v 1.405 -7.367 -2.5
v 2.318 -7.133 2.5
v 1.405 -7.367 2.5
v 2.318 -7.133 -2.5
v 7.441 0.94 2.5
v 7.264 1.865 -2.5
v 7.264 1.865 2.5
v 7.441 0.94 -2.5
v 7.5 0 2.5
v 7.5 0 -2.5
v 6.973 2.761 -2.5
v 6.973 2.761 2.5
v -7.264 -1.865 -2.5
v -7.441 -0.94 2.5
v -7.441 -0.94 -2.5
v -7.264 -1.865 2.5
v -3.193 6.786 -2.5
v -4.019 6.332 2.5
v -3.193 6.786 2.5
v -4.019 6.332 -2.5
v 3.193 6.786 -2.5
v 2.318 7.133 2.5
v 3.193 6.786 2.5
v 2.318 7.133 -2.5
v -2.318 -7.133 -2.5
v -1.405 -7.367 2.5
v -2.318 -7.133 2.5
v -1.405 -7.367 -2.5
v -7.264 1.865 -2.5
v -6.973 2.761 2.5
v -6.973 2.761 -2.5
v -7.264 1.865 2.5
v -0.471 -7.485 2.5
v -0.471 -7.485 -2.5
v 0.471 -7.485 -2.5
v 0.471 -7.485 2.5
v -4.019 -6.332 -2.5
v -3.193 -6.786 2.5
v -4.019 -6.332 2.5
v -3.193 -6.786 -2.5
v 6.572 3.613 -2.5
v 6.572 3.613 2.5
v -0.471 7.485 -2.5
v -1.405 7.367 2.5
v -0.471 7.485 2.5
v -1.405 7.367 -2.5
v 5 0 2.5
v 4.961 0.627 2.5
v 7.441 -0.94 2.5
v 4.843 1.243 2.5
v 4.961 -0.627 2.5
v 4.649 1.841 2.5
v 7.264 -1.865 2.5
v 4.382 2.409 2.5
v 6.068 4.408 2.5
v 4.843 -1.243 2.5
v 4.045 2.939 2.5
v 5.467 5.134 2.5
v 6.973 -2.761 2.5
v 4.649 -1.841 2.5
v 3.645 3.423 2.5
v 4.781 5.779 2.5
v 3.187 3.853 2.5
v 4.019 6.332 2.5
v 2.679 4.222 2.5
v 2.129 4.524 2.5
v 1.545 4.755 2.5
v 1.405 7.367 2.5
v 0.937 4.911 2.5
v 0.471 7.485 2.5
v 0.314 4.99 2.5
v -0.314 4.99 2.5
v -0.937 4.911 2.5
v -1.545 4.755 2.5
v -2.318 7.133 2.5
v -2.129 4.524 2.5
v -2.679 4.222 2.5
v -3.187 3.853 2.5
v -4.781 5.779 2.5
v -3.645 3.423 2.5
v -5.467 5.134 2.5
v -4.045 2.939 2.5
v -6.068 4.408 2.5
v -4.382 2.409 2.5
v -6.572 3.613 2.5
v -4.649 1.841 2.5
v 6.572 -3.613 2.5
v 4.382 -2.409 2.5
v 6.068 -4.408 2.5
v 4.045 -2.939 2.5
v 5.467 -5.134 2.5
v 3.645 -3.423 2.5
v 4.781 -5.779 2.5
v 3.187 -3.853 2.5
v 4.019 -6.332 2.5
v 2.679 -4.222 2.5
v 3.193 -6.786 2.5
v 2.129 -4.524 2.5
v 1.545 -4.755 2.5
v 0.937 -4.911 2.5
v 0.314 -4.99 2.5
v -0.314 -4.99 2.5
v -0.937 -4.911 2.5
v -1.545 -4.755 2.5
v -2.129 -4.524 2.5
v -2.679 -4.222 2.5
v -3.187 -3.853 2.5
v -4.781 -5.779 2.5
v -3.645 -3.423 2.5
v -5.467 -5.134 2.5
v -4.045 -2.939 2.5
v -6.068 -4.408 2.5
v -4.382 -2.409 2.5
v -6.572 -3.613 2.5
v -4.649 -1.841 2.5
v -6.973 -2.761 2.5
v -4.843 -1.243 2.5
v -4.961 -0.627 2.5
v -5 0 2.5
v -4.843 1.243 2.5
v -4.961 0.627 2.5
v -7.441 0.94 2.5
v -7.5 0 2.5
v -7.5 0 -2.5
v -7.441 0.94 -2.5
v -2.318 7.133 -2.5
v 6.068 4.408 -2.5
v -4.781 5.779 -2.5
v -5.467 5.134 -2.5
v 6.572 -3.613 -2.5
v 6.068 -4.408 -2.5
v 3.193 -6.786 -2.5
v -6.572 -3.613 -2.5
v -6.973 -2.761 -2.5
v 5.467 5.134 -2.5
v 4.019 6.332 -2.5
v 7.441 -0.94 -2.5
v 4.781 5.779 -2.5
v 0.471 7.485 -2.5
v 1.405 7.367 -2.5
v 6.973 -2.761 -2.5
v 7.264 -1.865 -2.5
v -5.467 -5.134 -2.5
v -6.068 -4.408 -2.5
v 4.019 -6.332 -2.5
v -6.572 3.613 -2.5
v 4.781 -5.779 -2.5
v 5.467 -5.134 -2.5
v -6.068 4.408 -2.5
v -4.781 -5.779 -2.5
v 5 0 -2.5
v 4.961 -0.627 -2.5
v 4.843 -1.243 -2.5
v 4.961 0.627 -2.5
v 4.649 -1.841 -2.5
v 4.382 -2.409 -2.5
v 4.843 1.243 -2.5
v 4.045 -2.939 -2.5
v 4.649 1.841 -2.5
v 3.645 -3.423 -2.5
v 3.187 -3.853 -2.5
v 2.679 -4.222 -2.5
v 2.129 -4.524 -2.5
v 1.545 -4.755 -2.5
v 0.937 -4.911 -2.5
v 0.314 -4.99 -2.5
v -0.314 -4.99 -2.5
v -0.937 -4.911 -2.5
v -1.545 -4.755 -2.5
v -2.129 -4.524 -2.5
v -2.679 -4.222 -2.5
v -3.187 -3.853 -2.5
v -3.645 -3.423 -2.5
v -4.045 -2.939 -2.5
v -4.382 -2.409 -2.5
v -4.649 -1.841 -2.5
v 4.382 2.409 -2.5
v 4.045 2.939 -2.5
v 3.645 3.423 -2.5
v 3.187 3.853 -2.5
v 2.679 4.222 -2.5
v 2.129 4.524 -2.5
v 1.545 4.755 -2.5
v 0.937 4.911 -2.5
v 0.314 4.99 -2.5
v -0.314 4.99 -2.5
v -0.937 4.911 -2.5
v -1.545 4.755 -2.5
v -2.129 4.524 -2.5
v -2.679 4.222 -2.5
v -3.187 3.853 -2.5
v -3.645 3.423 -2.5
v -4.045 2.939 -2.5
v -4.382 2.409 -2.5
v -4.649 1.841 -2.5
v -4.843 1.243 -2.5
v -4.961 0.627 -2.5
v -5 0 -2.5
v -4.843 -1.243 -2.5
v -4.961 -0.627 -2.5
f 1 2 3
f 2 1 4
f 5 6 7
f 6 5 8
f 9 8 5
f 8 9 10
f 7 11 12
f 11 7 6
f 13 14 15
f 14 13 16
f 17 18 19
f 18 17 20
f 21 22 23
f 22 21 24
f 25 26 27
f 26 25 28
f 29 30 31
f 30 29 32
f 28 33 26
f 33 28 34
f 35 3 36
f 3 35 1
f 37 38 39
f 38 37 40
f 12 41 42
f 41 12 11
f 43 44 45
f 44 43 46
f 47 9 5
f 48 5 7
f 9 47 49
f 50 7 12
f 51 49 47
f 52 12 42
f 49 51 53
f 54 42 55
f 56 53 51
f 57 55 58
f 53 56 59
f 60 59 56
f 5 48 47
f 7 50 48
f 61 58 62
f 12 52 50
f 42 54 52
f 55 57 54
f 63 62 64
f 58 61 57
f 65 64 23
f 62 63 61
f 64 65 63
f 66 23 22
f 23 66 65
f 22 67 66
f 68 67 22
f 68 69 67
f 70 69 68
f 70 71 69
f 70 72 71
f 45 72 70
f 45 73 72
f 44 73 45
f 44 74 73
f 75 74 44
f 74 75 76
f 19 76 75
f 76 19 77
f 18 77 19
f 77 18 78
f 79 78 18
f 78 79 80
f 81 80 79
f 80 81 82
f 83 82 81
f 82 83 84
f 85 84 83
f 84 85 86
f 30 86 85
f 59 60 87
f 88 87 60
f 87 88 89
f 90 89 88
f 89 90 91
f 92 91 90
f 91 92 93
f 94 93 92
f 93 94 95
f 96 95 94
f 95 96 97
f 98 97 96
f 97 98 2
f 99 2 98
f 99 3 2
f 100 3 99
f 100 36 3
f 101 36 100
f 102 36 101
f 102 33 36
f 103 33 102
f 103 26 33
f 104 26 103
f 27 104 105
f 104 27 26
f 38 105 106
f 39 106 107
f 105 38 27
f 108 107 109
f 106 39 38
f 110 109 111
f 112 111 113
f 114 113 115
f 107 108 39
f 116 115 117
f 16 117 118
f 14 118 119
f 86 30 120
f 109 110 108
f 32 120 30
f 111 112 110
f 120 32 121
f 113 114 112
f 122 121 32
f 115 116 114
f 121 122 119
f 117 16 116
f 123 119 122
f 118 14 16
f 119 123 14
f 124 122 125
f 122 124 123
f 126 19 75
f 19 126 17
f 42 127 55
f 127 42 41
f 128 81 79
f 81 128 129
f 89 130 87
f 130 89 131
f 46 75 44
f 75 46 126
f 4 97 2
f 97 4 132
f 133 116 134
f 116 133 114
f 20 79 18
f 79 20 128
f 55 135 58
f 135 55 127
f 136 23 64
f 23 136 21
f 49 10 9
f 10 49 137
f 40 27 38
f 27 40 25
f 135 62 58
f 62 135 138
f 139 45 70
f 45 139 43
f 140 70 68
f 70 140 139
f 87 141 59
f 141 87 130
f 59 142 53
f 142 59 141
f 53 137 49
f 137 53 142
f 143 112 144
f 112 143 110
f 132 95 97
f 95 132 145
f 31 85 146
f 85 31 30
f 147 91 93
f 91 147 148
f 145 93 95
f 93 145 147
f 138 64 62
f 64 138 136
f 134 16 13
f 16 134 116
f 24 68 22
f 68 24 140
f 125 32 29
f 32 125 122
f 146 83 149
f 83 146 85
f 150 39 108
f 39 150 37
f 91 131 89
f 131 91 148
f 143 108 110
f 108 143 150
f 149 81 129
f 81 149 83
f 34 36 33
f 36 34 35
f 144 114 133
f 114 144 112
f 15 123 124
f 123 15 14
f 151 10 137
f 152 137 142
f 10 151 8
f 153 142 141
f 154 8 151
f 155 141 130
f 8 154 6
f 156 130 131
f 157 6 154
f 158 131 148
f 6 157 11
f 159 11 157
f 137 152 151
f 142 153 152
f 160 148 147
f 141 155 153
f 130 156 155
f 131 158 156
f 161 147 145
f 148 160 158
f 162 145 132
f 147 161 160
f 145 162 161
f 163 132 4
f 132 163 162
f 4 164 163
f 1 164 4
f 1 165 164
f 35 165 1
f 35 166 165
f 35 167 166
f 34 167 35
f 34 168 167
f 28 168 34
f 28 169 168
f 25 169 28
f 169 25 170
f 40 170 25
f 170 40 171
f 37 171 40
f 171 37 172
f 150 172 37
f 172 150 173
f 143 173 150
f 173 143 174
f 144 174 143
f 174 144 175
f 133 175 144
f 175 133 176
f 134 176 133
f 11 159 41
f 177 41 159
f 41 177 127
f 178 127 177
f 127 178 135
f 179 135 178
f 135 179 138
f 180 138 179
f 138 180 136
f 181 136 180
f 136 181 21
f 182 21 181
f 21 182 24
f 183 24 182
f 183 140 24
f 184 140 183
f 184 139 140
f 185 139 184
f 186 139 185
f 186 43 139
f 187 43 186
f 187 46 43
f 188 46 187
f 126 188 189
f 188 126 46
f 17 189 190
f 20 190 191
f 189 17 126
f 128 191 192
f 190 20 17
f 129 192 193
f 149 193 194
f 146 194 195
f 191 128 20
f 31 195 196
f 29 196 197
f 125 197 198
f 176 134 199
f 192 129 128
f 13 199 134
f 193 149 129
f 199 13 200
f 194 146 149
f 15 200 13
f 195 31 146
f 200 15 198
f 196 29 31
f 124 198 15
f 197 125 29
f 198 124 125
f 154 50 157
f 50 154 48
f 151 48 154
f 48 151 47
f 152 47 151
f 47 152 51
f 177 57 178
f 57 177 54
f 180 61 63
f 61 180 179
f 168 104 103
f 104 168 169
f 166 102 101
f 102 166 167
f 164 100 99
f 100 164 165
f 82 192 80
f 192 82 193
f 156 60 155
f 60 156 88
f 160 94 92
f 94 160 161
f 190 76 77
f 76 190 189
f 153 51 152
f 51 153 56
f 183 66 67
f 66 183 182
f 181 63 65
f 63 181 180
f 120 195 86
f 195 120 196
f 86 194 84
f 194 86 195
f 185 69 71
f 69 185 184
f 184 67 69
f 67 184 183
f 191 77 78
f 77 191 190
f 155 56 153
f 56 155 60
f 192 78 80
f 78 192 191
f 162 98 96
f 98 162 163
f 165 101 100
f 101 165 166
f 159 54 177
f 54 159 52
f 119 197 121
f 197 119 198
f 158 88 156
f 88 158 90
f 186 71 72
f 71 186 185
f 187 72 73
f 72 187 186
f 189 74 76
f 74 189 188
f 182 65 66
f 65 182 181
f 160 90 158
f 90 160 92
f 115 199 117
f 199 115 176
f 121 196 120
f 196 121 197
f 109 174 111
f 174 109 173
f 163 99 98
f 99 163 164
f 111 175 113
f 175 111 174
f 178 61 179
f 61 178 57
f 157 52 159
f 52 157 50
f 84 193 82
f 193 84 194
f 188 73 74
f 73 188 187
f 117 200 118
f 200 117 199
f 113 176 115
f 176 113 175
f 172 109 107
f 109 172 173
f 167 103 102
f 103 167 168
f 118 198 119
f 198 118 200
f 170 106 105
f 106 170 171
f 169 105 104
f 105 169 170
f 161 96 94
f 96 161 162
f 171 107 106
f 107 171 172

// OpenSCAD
$fn = 50;


difference() {
	union() {
		translate(v = [0, 0, -2.5000000000]) {
			cylinder(h = 5, r = 7.5000000000);
		}
	}
	union() {
		translate(v = [0, 0, -100.0000000000]) {
			cylinder(h = 200, r = 5.0000000000);
		}
	}
}
